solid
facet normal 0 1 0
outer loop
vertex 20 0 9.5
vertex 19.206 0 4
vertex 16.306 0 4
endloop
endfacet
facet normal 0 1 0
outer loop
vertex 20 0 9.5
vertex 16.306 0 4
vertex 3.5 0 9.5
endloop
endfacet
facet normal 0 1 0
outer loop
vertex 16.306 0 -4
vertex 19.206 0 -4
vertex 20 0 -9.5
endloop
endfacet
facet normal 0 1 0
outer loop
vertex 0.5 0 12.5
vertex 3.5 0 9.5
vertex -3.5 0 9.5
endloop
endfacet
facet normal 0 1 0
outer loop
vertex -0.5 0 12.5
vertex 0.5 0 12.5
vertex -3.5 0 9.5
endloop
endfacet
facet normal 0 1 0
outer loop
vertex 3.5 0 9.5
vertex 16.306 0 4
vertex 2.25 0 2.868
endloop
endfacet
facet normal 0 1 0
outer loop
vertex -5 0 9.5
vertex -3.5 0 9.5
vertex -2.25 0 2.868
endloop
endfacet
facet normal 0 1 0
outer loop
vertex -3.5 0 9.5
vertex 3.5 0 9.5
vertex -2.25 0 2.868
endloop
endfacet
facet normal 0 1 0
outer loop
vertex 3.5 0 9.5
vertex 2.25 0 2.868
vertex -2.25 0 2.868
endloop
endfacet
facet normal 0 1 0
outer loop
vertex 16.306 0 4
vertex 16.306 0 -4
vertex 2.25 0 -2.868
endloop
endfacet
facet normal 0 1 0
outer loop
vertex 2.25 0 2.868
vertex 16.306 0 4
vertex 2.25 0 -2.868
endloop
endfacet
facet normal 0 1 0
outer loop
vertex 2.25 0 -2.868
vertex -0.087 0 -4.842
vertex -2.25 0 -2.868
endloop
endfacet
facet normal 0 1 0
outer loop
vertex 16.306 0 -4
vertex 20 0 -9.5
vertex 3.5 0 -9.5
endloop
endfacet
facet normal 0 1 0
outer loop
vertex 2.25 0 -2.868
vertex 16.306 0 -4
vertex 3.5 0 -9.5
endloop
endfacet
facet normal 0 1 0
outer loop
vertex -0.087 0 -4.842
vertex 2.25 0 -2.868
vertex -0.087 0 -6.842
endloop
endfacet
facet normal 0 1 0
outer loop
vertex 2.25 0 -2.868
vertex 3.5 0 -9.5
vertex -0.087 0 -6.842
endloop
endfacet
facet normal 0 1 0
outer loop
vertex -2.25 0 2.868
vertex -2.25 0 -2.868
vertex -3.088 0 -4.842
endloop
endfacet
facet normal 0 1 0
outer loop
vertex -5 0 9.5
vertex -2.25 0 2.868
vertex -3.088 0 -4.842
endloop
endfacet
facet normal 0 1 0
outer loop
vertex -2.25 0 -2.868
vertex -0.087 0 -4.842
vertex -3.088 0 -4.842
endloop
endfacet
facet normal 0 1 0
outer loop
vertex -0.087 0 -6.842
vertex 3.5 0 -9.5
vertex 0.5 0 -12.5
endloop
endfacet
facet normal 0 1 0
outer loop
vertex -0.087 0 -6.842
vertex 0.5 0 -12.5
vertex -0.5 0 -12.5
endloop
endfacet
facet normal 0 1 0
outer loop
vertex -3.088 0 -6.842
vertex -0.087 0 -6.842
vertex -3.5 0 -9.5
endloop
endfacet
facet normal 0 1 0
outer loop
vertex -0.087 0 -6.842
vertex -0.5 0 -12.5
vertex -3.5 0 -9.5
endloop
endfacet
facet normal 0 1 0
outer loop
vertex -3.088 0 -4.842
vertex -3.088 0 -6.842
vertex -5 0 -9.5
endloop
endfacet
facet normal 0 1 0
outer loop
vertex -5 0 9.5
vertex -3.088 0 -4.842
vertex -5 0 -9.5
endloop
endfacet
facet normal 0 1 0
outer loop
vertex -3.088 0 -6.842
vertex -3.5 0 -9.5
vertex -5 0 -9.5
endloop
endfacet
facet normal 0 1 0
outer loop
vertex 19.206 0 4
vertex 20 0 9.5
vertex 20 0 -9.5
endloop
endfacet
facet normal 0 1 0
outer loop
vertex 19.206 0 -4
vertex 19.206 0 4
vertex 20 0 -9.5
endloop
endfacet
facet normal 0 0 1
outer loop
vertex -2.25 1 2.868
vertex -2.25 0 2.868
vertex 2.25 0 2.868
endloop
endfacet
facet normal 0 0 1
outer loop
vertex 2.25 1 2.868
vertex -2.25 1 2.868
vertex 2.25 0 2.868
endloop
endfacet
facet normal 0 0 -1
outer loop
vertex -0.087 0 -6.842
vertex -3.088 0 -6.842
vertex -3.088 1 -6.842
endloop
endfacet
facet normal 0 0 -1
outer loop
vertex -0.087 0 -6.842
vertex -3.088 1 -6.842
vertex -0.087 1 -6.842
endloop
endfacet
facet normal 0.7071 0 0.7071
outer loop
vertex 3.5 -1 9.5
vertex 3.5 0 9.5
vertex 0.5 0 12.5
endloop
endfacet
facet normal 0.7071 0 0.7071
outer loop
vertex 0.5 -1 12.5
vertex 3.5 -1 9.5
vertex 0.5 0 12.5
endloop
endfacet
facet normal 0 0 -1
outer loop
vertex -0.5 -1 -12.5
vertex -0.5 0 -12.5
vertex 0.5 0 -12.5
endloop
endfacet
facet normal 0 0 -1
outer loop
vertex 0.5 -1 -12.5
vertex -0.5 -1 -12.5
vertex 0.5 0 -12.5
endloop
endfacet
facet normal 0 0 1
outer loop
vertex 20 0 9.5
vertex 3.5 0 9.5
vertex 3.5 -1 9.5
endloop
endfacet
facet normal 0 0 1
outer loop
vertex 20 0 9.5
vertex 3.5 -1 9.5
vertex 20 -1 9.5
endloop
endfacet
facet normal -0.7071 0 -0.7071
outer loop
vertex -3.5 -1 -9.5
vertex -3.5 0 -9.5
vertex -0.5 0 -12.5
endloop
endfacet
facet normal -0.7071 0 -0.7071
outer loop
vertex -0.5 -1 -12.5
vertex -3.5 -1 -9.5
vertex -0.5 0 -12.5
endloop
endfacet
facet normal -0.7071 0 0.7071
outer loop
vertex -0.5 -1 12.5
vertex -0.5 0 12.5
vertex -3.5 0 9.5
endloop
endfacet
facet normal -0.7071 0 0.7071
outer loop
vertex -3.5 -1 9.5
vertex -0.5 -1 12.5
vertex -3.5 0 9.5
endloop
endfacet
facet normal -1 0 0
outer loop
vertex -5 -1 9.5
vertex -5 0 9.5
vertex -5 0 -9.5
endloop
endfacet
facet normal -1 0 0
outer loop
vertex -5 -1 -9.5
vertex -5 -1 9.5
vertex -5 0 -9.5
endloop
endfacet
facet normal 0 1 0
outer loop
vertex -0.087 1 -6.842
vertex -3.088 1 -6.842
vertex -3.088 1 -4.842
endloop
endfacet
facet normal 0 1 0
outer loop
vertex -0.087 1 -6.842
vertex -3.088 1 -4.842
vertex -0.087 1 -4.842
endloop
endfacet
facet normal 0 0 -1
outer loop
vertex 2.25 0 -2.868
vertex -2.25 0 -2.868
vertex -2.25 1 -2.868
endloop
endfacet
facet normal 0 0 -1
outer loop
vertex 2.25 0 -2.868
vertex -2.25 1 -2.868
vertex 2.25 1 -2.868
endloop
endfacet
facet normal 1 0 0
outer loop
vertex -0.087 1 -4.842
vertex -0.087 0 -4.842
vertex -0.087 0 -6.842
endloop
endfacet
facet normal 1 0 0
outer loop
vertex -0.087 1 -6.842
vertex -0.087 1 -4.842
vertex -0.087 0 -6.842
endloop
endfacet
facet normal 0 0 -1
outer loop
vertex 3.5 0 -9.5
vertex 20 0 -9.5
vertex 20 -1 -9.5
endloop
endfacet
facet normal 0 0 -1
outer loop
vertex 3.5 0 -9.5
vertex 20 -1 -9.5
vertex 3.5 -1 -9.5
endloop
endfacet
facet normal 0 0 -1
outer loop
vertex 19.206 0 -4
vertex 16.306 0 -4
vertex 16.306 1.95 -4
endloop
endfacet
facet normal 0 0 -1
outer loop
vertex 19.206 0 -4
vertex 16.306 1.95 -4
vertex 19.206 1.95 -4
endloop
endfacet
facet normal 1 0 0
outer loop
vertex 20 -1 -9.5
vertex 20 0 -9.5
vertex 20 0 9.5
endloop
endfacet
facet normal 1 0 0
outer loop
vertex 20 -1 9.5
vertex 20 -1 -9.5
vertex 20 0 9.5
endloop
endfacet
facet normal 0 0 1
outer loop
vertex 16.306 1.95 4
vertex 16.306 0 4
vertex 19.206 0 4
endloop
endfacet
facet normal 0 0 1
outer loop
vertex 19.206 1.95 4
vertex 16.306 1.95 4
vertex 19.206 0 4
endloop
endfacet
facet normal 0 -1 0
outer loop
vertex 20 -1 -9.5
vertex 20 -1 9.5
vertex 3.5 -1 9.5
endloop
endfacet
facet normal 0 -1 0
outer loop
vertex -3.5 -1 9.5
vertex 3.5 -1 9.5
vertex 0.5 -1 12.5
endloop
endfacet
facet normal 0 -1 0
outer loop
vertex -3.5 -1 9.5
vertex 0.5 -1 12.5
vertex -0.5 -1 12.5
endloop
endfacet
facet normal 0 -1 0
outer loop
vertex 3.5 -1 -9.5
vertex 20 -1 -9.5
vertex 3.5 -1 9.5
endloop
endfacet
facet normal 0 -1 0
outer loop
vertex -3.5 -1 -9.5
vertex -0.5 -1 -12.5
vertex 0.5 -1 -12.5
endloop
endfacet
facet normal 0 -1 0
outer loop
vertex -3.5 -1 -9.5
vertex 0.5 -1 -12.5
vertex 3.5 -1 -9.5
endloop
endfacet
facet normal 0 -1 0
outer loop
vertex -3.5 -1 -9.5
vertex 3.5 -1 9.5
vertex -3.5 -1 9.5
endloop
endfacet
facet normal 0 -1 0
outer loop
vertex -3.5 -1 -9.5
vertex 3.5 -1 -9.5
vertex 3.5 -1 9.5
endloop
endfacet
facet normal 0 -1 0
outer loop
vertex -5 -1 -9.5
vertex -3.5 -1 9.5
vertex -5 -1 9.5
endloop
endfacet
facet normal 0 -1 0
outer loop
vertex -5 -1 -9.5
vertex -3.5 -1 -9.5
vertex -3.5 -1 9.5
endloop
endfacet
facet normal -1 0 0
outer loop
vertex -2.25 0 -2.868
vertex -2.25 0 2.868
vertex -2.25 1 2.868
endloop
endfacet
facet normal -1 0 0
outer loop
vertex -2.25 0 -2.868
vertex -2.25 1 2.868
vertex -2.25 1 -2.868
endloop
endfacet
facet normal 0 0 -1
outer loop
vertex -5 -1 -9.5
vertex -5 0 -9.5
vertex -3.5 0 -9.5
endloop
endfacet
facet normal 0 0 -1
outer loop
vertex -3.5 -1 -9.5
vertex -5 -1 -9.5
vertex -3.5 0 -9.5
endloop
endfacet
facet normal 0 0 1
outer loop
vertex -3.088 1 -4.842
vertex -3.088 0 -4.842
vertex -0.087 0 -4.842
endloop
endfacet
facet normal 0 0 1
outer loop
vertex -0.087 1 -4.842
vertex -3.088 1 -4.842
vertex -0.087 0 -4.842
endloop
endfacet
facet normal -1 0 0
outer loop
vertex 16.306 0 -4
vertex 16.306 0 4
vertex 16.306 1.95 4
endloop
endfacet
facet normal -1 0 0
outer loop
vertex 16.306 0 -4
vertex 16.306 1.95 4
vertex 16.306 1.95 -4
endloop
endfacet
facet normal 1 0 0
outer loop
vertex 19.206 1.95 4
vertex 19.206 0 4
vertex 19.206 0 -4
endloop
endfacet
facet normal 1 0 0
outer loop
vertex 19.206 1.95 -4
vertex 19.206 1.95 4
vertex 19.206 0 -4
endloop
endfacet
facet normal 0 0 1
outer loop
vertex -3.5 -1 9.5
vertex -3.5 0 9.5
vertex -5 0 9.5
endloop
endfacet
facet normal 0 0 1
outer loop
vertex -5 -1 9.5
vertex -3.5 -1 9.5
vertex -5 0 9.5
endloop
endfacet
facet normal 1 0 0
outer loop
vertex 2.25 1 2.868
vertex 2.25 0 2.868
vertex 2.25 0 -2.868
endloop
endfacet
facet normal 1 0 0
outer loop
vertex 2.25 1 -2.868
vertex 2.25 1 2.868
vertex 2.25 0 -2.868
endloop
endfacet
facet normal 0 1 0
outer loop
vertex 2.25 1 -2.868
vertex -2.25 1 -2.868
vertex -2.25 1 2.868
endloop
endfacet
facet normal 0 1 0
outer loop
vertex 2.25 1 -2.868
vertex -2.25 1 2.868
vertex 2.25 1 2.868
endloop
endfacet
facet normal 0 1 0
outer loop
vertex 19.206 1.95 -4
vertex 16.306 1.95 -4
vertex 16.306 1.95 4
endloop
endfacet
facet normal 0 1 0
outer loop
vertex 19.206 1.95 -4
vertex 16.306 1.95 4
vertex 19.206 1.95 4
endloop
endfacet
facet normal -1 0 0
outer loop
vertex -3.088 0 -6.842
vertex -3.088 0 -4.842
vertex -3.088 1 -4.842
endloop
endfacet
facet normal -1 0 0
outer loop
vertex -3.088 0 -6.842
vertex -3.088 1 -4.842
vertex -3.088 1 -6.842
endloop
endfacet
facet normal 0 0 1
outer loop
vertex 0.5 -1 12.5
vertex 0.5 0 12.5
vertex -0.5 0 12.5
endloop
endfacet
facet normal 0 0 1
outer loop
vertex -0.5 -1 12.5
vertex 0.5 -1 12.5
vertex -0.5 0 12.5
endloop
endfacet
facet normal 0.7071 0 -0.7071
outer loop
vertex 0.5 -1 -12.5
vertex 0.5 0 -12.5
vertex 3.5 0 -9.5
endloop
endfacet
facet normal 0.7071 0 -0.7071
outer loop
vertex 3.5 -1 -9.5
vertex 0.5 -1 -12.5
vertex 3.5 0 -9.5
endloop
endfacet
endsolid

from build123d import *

# Parameters (mm, degrees)
BOSS_EXTRUDE1_DEPTH = 1.000000032
SKETCH2_W           = 4.49999989
SKETCH2_H           = 5.735208424
SKETCH2_W_2         = 3
SKETCH2_H_2         = 2
BOSS_EXTRUDE2_DEPTH = 1
SKETCH3_W           = 2.900000042
SKETCH3_H           = 8.000000002
BOSS_EXTRUDE3_DEPTH = 1.94999991


with BuildPart() as part:
    # Sketch1 → Boss-Extrude1 (new body)
    with BuildSketch(Plane(origin=(0, 0, 0), x_dir=(1, 0, 0), z_dir=(0, 1, 0))):
        Polygon((-3.499999985, 9.50000005), (-0.499999889, 12.500000146), (0.499999889, 12.500000146), (3.499999985, 9.50000005), (4.999999906, 9.50000005), (20.000000132, 9.50000005), (20.000000132, -9.50000005), (4.999999906, -9.50000005), (3.499999985, -9.50000005), (0.499999889, -12.500000146), (-0.499999889, -12.500000146), (-3.499999985, -9.50000005), (-4.999999906, -9.50000005), (-4.999999906, 9.50000005), align=None)
    extrude(amount=-BOSS_EXTRUDE1_DEPTH)

    # Sketch2 → Boss-Extrude2 (add)
    with BuildSketch(Plane(origin=(0, 0, 0), x_dir=(1, 0, 0), z_dir=(0, 1, 0))):
        Rectangle(SKETCH2_W, SKETCH2_H)
        with Locations((-1.5875, 5.842)):
            Rectangle(SKETCH2_W_2, SKETCH2_H_2)
    extrude(amount=BOSS_EXTRUDE2_DEPTH)

    # Sketch3 → Boss-Extrude3 (add)
    with BuildSketch(Plane(origin=(0, 0, 0), x_dir=(1, 0, 0), z_dir=(0, 1, 0))):
        with Locations((17.756250111, 0)):
            Rectangle(SKETCH3_W, SKETCH3_H)
    extrude(amount=BOSS_EXTRUDE3_DEPTH)


solid = part.part
